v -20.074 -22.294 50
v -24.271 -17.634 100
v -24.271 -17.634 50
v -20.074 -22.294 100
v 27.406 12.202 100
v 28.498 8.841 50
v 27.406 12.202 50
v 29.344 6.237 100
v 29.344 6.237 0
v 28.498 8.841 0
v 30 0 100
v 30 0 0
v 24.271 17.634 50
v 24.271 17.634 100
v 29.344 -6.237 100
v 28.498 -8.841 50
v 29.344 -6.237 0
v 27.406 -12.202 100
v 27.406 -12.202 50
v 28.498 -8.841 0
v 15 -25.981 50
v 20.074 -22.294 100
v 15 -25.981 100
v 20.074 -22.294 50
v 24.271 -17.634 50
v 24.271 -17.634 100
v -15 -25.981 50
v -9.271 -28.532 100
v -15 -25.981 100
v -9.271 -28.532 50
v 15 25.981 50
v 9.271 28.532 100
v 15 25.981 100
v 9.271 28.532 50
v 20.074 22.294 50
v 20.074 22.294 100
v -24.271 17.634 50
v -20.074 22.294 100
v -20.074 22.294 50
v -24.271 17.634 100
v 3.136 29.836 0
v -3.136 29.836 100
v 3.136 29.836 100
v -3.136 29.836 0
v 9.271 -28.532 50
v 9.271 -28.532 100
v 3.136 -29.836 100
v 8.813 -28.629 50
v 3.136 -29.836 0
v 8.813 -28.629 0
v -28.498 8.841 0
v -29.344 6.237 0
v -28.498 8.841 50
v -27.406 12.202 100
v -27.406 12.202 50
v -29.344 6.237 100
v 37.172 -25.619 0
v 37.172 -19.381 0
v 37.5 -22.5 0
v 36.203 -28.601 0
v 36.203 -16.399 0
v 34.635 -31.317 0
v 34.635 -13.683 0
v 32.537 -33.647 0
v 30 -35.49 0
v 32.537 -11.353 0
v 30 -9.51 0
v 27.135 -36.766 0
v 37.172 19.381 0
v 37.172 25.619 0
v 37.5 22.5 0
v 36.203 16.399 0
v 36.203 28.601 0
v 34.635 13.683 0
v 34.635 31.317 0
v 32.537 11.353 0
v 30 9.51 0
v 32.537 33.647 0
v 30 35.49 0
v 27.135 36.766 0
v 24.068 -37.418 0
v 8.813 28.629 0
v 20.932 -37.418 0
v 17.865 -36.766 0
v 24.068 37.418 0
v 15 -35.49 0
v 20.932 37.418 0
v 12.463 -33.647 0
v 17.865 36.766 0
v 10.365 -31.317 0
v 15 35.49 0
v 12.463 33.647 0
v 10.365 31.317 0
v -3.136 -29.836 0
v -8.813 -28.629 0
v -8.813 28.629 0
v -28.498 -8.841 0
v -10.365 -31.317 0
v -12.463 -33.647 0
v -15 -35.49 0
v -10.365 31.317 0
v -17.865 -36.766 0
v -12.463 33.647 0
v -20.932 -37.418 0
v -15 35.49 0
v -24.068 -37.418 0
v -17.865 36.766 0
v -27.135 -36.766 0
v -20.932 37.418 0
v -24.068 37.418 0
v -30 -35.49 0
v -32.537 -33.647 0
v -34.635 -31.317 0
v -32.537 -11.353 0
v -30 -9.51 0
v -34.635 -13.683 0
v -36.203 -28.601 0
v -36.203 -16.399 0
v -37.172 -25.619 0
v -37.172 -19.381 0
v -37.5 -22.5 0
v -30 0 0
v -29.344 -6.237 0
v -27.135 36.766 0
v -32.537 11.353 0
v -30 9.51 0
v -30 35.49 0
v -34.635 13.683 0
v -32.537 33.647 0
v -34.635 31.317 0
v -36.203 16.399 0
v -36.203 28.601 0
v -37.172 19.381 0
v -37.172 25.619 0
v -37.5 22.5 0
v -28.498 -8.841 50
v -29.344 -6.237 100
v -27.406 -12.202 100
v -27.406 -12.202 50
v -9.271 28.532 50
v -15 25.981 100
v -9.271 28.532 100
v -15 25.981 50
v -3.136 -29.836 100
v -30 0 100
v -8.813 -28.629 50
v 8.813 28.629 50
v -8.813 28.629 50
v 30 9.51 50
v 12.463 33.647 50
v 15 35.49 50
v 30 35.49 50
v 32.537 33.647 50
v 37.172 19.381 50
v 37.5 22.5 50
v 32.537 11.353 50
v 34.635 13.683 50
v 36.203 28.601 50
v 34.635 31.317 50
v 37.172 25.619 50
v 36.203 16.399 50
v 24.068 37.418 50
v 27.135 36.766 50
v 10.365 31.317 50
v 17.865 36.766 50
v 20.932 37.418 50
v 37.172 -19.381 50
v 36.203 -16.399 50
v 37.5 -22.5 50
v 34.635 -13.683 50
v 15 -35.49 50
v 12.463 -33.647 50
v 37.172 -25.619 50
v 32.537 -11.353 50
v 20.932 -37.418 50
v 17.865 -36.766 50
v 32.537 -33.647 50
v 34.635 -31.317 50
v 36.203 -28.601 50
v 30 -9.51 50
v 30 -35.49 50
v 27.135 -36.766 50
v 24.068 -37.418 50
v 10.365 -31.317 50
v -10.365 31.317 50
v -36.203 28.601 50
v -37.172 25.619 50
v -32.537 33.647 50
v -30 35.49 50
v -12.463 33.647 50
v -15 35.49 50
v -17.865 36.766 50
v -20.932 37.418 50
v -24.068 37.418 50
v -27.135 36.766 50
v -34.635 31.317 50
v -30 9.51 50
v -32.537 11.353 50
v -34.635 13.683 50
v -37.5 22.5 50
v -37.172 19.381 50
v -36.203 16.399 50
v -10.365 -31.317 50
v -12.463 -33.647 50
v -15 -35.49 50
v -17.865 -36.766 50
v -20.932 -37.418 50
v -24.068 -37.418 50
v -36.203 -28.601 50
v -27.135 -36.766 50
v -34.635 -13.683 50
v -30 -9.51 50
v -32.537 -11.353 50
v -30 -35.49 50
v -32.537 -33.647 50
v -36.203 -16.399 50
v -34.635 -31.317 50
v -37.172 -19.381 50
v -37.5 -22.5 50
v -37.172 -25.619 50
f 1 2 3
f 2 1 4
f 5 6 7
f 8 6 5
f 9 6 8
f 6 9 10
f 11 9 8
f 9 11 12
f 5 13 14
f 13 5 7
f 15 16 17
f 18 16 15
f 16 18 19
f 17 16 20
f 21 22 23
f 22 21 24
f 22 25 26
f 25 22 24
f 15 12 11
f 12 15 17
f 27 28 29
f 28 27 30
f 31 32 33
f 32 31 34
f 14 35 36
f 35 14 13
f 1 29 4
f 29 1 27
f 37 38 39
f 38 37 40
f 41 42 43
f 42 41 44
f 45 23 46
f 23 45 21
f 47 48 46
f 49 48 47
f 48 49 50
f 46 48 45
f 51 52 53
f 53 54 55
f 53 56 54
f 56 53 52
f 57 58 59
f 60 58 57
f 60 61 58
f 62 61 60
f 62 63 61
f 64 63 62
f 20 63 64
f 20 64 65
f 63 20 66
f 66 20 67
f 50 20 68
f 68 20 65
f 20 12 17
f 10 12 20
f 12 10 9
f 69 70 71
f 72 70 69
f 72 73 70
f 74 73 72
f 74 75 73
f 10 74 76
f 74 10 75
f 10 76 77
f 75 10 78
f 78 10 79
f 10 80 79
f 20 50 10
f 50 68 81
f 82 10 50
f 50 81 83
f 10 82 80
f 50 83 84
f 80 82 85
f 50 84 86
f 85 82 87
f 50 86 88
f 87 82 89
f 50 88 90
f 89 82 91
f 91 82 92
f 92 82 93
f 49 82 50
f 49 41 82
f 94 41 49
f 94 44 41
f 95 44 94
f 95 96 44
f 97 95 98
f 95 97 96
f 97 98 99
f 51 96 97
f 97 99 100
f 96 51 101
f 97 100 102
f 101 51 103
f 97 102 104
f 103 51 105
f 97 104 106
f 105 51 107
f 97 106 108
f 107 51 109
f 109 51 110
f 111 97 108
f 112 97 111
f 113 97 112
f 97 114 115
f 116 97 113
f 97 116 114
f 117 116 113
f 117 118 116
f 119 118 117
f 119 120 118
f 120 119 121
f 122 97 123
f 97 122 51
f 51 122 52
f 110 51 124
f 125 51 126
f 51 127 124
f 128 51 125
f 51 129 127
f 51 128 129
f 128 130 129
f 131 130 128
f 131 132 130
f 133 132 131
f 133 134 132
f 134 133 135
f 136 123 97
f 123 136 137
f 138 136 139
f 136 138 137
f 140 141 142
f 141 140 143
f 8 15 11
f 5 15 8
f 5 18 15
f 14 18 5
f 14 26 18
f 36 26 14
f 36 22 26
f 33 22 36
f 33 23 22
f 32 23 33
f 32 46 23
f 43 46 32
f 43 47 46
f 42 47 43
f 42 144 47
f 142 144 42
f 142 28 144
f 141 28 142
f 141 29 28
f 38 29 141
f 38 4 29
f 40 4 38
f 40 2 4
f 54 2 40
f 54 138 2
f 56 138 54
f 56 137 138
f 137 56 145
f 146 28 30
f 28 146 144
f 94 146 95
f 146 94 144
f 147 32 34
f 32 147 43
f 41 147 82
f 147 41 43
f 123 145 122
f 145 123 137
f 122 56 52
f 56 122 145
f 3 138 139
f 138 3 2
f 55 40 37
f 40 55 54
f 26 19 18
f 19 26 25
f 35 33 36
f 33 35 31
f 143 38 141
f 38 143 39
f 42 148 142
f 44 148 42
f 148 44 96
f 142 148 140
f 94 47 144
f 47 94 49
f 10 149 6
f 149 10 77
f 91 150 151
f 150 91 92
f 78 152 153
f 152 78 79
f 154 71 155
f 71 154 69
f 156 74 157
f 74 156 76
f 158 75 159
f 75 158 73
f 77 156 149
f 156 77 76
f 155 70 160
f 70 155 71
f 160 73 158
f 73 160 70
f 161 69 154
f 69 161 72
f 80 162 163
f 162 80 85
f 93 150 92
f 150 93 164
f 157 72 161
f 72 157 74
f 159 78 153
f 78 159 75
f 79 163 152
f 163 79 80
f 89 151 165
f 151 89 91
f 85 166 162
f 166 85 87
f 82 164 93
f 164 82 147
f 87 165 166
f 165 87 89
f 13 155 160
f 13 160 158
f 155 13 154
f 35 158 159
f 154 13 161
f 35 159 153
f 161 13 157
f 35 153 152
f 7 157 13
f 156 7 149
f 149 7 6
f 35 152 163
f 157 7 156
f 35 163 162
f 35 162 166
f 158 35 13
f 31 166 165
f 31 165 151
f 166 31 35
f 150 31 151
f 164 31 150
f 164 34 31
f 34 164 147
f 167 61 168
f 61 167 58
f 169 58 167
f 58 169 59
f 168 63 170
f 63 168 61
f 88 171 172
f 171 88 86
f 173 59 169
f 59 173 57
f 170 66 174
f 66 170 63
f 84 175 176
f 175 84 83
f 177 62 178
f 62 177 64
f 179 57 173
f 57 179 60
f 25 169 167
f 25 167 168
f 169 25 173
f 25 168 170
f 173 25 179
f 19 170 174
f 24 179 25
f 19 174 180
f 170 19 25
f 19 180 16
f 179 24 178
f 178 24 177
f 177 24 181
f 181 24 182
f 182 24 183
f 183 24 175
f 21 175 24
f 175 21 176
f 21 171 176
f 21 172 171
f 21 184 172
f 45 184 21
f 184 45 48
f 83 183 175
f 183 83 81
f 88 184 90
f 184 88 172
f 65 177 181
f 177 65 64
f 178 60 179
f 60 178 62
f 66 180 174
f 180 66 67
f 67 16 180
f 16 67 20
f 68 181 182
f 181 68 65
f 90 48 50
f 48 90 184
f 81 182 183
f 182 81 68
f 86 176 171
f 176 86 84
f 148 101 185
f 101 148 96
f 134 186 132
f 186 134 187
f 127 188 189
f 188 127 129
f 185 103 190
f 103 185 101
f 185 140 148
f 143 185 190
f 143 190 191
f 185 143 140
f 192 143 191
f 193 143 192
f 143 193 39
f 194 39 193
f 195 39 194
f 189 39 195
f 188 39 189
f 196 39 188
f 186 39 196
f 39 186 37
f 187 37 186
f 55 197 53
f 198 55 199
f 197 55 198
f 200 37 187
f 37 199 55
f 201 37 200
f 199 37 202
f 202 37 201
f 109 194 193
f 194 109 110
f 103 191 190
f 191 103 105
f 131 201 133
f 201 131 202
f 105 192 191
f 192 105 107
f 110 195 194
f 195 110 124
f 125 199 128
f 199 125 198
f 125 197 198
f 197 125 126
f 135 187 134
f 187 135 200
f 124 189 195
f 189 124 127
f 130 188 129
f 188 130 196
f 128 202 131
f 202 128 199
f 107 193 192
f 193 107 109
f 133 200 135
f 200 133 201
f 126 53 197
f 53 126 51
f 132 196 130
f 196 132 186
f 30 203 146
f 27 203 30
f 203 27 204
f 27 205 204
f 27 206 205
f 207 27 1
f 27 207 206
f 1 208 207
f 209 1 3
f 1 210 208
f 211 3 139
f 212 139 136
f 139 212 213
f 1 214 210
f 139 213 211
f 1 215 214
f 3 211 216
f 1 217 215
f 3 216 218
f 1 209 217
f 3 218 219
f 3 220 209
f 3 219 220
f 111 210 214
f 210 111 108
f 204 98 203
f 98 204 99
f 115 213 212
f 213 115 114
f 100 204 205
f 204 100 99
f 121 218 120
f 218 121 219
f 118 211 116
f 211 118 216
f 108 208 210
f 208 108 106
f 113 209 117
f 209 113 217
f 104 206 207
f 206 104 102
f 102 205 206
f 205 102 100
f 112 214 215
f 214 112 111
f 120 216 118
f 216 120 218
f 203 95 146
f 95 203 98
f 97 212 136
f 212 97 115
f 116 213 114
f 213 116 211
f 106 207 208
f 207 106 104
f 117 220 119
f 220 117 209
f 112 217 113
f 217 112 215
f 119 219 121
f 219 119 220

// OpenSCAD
height=100;
diameter1=30;
diameter2=diameter1/2;
offset=diameter1/2+diameter2/2;
subRocket=.5;
cylinder(height, diameter1, diameter1);

translate([offset,offset,0])cylinder(height*subRocket,diameter2,diameter2);
translate([offset,-offset,0])cylinder(height*subRocket,diameter2,diameter2);
translate([-offset,offset,0])cylinder(height*subRocket,diameter2,diameter2);
translate([-offset,-offset,0])cylinder(height*subRocket,diameter2,diameter2);
